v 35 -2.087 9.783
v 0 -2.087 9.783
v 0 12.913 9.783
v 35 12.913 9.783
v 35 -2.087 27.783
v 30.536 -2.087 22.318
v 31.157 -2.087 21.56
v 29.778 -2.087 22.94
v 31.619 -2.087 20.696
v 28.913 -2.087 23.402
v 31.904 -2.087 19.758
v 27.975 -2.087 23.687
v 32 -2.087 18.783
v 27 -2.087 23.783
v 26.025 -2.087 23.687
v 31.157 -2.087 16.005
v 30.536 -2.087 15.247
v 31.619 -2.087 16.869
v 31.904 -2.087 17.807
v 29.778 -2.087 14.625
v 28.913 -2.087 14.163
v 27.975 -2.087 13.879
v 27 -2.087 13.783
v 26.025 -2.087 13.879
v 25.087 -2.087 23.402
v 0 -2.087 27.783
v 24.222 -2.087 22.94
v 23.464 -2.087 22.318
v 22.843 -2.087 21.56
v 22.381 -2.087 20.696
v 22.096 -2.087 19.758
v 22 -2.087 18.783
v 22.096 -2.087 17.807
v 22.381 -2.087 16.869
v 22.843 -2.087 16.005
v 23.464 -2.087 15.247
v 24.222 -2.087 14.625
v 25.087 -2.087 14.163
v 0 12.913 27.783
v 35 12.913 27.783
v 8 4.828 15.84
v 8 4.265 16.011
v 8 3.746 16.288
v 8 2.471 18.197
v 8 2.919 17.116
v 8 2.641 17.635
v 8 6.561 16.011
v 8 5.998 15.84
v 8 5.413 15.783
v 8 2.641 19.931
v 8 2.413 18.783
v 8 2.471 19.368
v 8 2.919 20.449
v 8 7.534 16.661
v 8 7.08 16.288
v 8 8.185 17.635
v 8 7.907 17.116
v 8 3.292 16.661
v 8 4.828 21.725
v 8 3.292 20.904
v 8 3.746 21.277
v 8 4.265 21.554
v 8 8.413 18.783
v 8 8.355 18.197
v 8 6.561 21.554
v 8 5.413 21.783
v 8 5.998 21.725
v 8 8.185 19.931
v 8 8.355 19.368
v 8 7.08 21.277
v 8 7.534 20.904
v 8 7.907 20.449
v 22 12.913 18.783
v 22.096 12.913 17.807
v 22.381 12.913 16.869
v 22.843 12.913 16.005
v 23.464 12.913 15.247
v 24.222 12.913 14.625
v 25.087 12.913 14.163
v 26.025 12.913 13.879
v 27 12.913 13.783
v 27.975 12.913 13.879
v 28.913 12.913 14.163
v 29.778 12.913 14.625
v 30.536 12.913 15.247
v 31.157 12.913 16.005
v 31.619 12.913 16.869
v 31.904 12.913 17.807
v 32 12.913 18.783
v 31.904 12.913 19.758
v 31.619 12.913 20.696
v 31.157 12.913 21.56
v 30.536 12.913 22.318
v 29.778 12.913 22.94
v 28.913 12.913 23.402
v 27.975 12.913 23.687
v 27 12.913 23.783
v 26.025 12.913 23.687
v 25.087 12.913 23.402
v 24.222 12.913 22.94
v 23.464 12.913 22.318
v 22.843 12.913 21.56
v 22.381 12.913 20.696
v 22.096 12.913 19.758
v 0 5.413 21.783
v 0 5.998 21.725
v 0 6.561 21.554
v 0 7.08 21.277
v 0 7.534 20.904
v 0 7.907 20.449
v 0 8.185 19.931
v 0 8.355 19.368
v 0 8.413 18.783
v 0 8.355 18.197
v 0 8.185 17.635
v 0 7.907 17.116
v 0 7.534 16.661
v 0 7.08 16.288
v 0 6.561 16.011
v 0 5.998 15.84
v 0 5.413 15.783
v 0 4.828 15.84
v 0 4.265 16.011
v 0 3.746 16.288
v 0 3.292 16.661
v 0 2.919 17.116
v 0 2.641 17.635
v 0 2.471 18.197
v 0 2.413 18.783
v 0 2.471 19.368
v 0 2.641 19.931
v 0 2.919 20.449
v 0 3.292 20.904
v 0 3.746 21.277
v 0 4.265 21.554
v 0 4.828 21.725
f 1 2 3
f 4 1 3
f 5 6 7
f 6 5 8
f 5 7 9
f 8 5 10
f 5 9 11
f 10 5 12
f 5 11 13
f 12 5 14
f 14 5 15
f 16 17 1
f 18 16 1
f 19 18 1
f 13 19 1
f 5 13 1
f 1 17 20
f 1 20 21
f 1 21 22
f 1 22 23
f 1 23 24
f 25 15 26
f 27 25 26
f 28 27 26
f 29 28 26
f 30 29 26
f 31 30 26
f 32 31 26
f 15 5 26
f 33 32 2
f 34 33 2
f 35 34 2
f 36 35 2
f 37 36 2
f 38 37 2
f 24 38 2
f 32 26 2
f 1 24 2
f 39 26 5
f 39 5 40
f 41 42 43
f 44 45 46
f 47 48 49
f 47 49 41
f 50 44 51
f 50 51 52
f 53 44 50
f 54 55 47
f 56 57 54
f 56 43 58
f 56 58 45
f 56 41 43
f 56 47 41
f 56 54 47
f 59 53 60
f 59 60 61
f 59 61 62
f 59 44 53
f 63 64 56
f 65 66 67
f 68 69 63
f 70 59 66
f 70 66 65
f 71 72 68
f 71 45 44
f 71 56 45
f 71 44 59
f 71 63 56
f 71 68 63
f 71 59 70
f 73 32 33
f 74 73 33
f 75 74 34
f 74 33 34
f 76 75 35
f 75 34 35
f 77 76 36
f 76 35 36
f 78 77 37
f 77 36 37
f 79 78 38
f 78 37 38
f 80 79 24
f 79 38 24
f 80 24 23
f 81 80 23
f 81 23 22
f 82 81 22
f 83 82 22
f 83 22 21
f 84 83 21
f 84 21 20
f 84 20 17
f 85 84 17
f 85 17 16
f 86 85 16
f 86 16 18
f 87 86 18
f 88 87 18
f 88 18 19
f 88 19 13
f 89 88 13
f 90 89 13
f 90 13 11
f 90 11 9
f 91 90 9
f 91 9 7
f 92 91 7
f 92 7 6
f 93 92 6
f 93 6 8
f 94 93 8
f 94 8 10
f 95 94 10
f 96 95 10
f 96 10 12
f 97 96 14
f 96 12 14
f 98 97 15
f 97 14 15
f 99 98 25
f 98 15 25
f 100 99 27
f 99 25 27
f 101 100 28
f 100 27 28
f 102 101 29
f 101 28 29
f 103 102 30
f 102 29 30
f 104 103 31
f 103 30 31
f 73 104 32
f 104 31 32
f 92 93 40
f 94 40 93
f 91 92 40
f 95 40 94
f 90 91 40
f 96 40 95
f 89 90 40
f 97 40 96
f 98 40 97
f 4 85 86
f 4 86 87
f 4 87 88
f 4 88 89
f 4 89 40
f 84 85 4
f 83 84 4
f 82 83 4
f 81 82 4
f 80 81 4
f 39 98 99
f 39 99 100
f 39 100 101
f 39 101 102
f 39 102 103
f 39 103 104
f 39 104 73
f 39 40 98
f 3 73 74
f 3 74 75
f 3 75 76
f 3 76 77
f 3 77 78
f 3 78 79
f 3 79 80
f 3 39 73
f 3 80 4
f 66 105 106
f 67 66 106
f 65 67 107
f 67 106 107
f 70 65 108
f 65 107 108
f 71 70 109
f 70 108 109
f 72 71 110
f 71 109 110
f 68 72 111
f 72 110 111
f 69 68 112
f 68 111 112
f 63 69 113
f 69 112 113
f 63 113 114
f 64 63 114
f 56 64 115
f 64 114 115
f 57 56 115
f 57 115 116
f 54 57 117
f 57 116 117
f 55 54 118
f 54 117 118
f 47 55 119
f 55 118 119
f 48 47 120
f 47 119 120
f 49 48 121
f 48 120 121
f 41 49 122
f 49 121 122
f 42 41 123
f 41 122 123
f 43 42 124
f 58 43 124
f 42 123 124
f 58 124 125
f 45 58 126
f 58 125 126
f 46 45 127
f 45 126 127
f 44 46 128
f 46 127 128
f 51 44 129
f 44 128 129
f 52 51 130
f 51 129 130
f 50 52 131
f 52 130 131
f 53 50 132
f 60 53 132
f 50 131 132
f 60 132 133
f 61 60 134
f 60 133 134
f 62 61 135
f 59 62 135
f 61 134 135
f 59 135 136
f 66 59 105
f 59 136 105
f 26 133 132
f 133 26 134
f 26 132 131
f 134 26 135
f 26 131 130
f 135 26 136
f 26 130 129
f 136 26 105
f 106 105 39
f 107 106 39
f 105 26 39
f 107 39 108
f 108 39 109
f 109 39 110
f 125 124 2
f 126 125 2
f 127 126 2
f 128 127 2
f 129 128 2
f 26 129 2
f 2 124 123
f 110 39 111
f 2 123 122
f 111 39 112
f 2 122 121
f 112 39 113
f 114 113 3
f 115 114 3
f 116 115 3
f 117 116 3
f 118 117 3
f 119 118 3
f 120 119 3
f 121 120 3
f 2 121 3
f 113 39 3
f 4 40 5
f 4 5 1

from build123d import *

# Parameters (mm, degrees)
SKETCH1_W           = 18
SKETCH1_H           = 15
BOSS_EXTRUDE1_DEPTH = 35
SKETCH2_R           = 5
CUT_EXTRUDE1_DEPTH  = 16
SKETCH3_R           = 3
CUT_EXTRUDE2_DEPTH  = 8


with BuildPart() as part:
    # Sketch1 → Boss-Extrude1 (new body)
    with BuildSketch(Plane(origin=(0, 0, 0), x_dir=(0, 0, -1), z_dir=(1, 0, 0))):
        with Locations((-18.782608696, 5.413043478)):
            Rectangle(SKETCH1_W, SKETCH1_H)
    extrude(amount=BOSS_EXTRUDE1_DEPTH)

    # Sketch2 → Cut-Extrude1 (cut, through all)
    with BuildSketch(Plane(origin=(0, -2.086956522, 0), x_dir=(-1, 0, 0), z_dir=(0, -1, 0))):
        with Locations((-27, -18.782608696)):
            Circle(SKETCH2_R)
    extrude(amount=-CUT_EXTRUDE1_DEPTH, mode=Mode.SUBTRACT)

    # Sketch3 → Cut-Extrude2 (cut)
    with BuildSketch(Plane.ZY):
        with Locations((18.782608696, 5.413043478)):
            Circle(SKETCH3_R)
    extrude(amount=-CUT_EXTRUDE2_DEPTH, mode=Mode.SUBTRACT)


solid = part.part
